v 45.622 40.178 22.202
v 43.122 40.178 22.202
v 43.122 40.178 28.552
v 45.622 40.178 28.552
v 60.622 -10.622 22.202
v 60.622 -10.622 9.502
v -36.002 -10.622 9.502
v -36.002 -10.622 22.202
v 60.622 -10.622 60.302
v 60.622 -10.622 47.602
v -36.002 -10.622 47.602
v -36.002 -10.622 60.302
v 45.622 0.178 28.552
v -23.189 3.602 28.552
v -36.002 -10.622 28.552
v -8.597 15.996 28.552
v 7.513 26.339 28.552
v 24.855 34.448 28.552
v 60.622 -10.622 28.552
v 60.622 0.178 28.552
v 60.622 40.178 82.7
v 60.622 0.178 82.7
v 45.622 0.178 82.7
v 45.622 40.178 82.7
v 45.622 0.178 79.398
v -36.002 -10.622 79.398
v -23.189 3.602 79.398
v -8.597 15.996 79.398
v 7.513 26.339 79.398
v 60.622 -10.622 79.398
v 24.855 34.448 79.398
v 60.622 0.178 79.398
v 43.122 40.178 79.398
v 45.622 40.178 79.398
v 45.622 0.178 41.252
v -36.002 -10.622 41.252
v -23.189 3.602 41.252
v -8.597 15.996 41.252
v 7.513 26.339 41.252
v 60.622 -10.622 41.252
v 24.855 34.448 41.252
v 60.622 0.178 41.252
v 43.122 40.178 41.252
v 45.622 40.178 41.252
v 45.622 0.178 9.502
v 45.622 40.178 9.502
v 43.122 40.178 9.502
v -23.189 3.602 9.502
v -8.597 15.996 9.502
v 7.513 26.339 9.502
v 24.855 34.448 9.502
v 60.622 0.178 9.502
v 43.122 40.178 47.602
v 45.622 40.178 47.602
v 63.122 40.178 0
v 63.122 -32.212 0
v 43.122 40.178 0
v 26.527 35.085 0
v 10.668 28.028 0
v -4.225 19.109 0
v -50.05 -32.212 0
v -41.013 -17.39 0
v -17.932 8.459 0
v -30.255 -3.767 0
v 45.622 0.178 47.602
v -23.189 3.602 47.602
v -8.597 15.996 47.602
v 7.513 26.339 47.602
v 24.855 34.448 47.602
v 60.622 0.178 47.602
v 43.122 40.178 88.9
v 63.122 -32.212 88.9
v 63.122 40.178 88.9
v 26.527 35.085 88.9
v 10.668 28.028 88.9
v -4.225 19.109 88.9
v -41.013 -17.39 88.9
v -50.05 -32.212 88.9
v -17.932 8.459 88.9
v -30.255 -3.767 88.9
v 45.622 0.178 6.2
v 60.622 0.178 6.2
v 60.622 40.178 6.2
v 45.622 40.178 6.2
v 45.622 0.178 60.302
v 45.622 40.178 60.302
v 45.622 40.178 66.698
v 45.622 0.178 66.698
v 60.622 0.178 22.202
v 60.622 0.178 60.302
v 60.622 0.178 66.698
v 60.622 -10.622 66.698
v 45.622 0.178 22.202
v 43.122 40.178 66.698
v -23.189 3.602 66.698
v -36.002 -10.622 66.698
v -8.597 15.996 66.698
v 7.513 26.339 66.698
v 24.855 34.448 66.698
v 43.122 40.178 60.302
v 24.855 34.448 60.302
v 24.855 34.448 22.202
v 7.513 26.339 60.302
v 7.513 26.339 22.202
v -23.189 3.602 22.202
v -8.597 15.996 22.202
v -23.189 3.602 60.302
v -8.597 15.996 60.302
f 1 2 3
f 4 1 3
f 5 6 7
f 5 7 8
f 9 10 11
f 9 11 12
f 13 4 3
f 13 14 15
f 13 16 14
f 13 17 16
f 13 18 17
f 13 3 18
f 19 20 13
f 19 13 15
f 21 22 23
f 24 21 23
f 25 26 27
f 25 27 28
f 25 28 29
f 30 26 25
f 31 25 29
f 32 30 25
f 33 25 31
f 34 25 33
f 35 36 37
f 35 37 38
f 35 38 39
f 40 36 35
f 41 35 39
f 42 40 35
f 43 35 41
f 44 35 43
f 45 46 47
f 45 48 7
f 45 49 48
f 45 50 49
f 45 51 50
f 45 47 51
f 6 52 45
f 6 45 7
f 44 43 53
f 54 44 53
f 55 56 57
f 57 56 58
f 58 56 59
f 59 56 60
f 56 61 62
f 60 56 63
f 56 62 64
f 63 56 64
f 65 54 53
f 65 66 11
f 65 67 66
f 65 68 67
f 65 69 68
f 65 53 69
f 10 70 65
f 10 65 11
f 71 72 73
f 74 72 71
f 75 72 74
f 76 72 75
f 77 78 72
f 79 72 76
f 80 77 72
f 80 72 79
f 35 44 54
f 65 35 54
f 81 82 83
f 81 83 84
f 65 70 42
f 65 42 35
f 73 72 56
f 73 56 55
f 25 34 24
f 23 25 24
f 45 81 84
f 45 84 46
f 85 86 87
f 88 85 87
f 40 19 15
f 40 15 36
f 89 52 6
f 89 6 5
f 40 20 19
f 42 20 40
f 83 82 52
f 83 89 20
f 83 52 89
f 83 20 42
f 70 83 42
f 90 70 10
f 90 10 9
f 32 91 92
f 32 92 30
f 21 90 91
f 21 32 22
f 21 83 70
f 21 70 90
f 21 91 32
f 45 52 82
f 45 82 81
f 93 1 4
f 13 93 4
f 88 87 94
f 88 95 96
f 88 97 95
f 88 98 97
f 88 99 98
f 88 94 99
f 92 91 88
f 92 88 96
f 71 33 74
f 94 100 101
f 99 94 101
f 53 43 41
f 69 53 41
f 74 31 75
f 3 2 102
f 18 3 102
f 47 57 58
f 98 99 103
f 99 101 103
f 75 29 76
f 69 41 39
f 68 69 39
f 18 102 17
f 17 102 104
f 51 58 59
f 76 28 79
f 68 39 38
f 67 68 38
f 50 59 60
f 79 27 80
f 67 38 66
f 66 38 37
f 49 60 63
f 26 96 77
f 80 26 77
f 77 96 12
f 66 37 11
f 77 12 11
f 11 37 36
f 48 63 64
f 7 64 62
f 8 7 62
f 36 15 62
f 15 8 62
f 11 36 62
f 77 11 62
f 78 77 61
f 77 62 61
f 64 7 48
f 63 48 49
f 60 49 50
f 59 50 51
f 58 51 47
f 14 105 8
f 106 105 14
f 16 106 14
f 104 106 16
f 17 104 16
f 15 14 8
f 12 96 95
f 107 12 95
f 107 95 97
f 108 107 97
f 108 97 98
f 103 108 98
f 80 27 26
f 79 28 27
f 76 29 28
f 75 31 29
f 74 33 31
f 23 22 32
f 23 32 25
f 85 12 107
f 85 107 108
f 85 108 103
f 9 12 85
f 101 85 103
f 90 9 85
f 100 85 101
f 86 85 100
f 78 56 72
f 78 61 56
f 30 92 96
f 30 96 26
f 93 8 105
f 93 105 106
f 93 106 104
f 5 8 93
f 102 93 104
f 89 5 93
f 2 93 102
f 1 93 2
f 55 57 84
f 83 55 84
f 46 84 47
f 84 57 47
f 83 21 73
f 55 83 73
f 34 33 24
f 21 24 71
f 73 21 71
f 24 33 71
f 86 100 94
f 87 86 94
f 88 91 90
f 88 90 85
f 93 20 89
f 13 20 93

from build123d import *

# Parameters (mm, degrees)
F1_DEPTH = 88.9
F3_W     = 72.389998
F3_H     = 88.9
F4_DEPTH = 20
F5_W     = 15
F5_H     = 76.5
F6_DEPTH = 40
F7_W     = 10.8
F7_H     = 12.7
F7_W_2   = 40
F8_DEPTH = 110.672824


with BuildPart() as f1:
    # F0 (on Top) → F1 (new body)
    with BuildSketch(Plane.XY):
        with BuildLine():
            ThreePointArc((43.122277, 40.17818), (-11.239462, 13.991304), (-50.049547, -32.211818))
            Line((-50.049547, -32.211818), (43.122277, -32.211818))
            Line((43.122277, -32.211818), (43.122277, 40.17818))
        make_face()
    extrude(amount=F1_DEPTH)

    # F3 (on face) → F4 (join)
    with BuildSketch(Plane.YZ.offset(43.122277)):
        with Locations((3.983181, 44.45)):
            Rectangle(F3_W, F3_H)
    extrude(amount=F4_DEPTH)

    # F5 (on face) → F6 (cut)
    with BuildSketch(Plane(origin=(0, 40.17818, 0), x_dir=(-1, 0, 0), z_dir=(0, 1, 0))):
        with Locations((-53.122277, 44.45)):
            Rectangle(F5_W, F5_H)
    extrude(amount=-F6_DEPTH, mode=Mode.SUBTRACT)

    # F7 (on face) → F8 (cut, through all)
    with BuildSketch(Plane(origin=(60.622277, 0, 0), x_dir=(0, -1, 0), z_dir=(-1, 0, 0))):
        with Locations((5.22182, 15.852)):
            Rectangle(F7_W, F7_H)
        with Locations((5.22182, 34.902)):
            Rectangle(F7_W, F7_H)
        with Locations((5.22182, 53.952)):
            Rectangle(F7_W, F7_H)
        with Locations((5.22182, 73.048)):
            Rectangle(F7_W, F7_H)
        with Locations((-20.17818, 15.852)):
            Rectangle(F7_W_2, F7_H)
        with Locations((-20.17818, 34.902)):
            Rectangle(F7_W_2, F7_H)
        with Locations((-20.17818, 53.952)):
            Rectangle(F7_W_2, F7_H)
        with Locations((-20.17818, 73.048)):
            Rectangle(F7_W_2, F7_H)
    extrude(amount=F8_DEPTH, mode=Mode.SUBTRACT)


solid = f1.part
